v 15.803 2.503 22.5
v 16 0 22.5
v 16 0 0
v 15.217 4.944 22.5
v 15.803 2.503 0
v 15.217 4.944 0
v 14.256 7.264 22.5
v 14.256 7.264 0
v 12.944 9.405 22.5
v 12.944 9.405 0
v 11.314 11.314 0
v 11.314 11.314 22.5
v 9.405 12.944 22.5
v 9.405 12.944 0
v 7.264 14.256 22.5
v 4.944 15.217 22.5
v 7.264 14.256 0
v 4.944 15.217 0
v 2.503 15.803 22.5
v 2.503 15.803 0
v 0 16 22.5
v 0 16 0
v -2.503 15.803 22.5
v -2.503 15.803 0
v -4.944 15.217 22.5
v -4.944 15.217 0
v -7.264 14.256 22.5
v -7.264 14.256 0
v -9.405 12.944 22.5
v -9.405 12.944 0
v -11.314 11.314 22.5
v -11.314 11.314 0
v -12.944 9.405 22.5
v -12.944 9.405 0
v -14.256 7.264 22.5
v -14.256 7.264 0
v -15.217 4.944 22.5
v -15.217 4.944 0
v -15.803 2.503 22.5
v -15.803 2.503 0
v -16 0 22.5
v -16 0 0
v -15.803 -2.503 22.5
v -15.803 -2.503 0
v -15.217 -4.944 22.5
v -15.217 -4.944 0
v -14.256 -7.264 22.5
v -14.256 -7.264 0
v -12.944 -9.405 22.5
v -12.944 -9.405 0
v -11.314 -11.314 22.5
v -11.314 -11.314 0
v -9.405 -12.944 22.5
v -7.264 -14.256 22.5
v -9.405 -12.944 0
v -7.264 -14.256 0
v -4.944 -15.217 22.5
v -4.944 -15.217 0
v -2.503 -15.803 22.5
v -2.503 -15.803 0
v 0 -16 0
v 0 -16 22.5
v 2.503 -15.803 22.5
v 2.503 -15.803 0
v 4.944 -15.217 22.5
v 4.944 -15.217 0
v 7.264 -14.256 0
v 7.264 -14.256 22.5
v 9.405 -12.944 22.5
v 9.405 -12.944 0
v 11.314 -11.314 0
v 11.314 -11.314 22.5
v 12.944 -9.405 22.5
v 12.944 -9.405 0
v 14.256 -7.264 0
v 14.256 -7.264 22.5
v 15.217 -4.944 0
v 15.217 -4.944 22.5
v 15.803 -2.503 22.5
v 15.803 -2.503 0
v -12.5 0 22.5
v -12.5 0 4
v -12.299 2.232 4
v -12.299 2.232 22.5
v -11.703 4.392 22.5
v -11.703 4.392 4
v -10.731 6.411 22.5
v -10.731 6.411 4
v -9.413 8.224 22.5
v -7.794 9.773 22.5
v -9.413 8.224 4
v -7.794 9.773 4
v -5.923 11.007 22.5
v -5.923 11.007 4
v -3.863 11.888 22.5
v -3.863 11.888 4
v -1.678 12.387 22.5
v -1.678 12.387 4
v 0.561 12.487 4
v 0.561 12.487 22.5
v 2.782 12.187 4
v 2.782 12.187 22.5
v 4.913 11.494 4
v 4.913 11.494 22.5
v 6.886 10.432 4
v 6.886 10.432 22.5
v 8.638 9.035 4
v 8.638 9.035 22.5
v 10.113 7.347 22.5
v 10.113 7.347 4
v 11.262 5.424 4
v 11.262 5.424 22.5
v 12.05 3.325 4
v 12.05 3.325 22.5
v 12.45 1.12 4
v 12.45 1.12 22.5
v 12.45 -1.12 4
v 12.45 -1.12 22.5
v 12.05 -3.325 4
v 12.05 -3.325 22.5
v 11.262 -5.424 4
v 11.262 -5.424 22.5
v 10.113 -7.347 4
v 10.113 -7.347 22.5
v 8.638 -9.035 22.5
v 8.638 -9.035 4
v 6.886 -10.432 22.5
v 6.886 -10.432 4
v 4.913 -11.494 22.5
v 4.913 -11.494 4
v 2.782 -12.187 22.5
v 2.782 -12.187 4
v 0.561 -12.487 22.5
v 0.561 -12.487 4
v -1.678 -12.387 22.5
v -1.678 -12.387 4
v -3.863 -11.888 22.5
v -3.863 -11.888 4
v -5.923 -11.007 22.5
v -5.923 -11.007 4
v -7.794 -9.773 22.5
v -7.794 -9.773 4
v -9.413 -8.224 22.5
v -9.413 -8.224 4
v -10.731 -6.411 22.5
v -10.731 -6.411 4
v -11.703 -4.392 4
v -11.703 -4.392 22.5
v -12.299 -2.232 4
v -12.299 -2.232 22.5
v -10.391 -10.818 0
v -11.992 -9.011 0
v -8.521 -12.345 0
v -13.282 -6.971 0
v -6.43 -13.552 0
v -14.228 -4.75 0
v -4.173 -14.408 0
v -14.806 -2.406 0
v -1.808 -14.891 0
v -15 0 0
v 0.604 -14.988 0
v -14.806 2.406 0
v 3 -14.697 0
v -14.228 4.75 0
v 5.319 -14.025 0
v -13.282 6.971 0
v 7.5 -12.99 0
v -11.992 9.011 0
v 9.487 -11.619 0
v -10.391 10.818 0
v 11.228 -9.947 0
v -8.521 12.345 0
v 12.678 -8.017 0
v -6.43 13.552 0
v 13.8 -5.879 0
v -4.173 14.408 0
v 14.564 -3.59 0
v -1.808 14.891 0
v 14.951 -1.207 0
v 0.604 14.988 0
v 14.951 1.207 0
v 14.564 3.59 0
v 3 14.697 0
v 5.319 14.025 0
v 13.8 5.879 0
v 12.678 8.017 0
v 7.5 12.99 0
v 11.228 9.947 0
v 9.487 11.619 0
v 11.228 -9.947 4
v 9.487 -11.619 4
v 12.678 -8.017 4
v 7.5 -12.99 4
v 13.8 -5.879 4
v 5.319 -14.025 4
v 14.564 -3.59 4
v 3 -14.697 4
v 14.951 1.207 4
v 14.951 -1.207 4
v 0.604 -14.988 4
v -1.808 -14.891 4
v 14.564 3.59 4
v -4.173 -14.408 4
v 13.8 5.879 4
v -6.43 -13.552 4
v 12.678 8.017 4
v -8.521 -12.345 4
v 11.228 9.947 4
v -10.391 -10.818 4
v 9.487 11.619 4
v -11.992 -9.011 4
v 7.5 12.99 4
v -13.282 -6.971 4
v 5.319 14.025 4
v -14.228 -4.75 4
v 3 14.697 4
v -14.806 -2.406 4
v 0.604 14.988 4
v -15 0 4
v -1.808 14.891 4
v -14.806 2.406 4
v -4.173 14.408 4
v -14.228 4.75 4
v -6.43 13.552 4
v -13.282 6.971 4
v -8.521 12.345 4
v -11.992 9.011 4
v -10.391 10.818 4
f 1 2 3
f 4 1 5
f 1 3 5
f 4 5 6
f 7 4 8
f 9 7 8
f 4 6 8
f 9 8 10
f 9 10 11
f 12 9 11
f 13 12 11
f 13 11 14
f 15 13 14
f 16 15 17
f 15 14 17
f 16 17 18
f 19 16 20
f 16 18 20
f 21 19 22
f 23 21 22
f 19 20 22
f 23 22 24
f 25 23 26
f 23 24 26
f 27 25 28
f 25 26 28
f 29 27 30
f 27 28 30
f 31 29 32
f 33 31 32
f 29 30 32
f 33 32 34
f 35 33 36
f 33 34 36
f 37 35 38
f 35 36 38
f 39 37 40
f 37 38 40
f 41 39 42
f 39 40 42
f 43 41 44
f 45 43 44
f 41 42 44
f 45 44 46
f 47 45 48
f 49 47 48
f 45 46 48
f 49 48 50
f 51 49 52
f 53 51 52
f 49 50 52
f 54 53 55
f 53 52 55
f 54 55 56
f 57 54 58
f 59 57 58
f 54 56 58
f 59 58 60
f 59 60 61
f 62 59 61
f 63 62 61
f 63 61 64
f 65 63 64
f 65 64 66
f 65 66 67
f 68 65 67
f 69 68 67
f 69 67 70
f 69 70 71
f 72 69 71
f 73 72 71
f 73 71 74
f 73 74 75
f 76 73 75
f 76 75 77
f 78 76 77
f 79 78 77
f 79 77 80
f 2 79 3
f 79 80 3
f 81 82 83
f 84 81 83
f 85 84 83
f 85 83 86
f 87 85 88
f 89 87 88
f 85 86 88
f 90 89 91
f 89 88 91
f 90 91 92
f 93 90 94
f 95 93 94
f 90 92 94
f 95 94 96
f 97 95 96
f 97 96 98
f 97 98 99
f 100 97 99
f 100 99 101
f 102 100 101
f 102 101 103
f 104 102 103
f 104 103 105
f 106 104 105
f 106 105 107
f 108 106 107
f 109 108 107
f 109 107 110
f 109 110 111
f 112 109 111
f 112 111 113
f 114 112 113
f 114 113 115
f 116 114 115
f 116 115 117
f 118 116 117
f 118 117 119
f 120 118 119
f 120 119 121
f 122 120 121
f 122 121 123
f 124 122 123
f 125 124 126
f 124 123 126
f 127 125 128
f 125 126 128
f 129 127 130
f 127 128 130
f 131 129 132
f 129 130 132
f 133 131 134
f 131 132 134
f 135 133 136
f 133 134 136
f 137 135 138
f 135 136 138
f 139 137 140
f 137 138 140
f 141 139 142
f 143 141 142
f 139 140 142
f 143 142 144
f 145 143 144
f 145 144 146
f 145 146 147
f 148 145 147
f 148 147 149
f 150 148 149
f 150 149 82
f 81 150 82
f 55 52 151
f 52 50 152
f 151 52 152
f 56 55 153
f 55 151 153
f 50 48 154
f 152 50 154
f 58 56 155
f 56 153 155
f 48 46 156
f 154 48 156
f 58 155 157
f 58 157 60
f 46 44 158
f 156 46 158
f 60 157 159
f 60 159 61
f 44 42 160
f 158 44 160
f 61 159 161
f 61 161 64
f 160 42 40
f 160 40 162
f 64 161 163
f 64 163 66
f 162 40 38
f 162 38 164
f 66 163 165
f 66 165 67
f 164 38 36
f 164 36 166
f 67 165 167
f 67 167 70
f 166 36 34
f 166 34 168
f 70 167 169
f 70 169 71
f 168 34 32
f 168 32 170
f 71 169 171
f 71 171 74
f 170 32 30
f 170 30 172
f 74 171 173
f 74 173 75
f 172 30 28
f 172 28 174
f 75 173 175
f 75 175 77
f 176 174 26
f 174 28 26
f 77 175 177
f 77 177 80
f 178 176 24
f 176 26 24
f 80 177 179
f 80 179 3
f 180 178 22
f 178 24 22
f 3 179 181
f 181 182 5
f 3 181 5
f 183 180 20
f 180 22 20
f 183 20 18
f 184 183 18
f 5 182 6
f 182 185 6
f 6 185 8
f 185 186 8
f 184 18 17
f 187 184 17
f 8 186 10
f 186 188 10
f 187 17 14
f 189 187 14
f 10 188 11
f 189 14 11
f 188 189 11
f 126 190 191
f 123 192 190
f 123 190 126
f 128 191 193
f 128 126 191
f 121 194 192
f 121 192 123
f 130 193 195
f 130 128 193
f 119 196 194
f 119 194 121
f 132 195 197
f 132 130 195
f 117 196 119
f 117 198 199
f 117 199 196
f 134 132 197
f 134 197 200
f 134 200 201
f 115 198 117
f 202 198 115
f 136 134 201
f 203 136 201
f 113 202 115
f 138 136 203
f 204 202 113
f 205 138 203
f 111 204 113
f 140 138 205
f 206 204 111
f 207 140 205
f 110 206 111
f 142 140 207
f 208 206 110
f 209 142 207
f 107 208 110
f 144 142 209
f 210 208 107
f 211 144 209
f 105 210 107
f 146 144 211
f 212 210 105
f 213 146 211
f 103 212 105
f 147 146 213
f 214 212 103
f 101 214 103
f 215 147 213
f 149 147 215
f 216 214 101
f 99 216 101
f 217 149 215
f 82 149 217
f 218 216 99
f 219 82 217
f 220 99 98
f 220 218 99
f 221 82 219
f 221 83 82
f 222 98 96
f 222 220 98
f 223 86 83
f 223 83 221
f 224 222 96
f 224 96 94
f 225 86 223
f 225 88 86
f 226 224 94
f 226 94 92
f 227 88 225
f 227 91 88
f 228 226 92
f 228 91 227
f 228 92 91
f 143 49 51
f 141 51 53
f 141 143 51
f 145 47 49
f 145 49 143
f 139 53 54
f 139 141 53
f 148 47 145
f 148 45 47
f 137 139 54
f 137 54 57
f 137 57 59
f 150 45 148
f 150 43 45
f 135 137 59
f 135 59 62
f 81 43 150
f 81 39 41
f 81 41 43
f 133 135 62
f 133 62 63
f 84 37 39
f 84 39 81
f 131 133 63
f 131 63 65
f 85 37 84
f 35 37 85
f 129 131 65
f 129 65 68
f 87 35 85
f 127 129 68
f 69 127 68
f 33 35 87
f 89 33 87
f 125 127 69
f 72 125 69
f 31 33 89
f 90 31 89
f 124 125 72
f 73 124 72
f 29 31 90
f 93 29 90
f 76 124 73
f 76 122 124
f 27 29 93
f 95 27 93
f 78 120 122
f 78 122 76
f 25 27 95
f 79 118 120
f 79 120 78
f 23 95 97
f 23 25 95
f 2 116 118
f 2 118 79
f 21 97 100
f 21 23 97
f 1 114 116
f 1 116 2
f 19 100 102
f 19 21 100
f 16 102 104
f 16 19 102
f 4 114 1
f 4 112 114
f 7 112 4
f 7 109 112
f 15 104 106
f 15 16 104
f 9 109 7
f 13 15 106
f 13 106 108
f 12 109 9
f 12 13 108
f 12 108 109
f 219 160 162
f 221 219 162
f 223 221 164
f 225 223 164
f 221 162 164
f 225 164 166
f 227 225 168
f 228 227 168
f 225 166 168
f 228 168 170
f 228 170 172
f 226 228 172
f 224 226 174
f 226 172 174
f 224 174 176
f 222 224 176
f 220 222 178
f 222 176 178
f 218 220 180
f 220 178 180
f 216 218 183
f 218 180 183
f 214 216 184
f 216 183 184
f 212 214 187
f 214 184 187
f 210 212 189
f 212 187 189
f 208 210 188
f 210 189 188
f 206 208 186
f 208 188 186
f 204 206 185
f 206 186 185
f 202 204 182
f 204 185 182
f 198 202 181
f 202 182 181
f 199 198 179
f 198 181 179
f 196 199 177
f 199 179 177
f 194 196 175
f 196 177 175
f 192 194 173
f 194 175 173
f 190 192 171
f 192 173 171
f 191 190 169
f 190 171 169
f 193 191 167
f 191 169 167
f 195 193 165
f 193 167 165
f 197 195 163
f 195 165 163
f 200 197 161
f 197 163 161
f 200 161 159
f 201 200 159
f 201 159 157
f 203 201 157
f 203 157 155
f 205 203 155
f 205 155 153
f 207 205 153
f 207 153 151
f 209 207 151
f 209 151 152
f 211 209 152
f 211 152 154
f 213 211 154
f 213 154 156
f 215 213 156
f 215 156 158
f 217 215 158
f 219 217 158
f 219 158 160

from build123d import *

# Parameters (mm, degrees)
SKETCH_1_R          = 16
EXTRUDE_1_DEPTH     = 22.5
SKETCH_2_R          = 15
CUT_EXTRUDE_3_DEPTH = 4
SKETCH_3_R          = 12.5
CUT_EXTRUDE_4_DEPTH = 19.5


with BuildPart() as part:
    # Эскиз1 → Вытянуть1 (new body)
    with BuildSketch(Plane.XY):
        Circle(SKETCH_1_R)
    extrude(amount=EXTRUDE_1_DEPTH)

    # Эскиз2 → Вытянуть3 (cut)
    with BuildSketch(Plane(origin=(0, 0, 0), x_dir=(-1, 0, 0), z_dir=(0, 0, -1))):
        Circle(SKETCH_2_R)
    extrude(amount=-CUT_EXTRUDE_3_DEPTH, mode=Mode.SUBTRACT)

    # Эскиз3 → Вытянуть4 (cut, through all)
    with BuildSketch(Plane(origin=(0, 0, 4), x_dir=(-1, 0, 0), z_dir=(0, 0, -1))):
        Circle(SKETCH_3_R)
    extrude(amount=-CUT_EXTRUDE_4_DEPTH, mode=Mode.SUBTRACT)


solid = part.part
